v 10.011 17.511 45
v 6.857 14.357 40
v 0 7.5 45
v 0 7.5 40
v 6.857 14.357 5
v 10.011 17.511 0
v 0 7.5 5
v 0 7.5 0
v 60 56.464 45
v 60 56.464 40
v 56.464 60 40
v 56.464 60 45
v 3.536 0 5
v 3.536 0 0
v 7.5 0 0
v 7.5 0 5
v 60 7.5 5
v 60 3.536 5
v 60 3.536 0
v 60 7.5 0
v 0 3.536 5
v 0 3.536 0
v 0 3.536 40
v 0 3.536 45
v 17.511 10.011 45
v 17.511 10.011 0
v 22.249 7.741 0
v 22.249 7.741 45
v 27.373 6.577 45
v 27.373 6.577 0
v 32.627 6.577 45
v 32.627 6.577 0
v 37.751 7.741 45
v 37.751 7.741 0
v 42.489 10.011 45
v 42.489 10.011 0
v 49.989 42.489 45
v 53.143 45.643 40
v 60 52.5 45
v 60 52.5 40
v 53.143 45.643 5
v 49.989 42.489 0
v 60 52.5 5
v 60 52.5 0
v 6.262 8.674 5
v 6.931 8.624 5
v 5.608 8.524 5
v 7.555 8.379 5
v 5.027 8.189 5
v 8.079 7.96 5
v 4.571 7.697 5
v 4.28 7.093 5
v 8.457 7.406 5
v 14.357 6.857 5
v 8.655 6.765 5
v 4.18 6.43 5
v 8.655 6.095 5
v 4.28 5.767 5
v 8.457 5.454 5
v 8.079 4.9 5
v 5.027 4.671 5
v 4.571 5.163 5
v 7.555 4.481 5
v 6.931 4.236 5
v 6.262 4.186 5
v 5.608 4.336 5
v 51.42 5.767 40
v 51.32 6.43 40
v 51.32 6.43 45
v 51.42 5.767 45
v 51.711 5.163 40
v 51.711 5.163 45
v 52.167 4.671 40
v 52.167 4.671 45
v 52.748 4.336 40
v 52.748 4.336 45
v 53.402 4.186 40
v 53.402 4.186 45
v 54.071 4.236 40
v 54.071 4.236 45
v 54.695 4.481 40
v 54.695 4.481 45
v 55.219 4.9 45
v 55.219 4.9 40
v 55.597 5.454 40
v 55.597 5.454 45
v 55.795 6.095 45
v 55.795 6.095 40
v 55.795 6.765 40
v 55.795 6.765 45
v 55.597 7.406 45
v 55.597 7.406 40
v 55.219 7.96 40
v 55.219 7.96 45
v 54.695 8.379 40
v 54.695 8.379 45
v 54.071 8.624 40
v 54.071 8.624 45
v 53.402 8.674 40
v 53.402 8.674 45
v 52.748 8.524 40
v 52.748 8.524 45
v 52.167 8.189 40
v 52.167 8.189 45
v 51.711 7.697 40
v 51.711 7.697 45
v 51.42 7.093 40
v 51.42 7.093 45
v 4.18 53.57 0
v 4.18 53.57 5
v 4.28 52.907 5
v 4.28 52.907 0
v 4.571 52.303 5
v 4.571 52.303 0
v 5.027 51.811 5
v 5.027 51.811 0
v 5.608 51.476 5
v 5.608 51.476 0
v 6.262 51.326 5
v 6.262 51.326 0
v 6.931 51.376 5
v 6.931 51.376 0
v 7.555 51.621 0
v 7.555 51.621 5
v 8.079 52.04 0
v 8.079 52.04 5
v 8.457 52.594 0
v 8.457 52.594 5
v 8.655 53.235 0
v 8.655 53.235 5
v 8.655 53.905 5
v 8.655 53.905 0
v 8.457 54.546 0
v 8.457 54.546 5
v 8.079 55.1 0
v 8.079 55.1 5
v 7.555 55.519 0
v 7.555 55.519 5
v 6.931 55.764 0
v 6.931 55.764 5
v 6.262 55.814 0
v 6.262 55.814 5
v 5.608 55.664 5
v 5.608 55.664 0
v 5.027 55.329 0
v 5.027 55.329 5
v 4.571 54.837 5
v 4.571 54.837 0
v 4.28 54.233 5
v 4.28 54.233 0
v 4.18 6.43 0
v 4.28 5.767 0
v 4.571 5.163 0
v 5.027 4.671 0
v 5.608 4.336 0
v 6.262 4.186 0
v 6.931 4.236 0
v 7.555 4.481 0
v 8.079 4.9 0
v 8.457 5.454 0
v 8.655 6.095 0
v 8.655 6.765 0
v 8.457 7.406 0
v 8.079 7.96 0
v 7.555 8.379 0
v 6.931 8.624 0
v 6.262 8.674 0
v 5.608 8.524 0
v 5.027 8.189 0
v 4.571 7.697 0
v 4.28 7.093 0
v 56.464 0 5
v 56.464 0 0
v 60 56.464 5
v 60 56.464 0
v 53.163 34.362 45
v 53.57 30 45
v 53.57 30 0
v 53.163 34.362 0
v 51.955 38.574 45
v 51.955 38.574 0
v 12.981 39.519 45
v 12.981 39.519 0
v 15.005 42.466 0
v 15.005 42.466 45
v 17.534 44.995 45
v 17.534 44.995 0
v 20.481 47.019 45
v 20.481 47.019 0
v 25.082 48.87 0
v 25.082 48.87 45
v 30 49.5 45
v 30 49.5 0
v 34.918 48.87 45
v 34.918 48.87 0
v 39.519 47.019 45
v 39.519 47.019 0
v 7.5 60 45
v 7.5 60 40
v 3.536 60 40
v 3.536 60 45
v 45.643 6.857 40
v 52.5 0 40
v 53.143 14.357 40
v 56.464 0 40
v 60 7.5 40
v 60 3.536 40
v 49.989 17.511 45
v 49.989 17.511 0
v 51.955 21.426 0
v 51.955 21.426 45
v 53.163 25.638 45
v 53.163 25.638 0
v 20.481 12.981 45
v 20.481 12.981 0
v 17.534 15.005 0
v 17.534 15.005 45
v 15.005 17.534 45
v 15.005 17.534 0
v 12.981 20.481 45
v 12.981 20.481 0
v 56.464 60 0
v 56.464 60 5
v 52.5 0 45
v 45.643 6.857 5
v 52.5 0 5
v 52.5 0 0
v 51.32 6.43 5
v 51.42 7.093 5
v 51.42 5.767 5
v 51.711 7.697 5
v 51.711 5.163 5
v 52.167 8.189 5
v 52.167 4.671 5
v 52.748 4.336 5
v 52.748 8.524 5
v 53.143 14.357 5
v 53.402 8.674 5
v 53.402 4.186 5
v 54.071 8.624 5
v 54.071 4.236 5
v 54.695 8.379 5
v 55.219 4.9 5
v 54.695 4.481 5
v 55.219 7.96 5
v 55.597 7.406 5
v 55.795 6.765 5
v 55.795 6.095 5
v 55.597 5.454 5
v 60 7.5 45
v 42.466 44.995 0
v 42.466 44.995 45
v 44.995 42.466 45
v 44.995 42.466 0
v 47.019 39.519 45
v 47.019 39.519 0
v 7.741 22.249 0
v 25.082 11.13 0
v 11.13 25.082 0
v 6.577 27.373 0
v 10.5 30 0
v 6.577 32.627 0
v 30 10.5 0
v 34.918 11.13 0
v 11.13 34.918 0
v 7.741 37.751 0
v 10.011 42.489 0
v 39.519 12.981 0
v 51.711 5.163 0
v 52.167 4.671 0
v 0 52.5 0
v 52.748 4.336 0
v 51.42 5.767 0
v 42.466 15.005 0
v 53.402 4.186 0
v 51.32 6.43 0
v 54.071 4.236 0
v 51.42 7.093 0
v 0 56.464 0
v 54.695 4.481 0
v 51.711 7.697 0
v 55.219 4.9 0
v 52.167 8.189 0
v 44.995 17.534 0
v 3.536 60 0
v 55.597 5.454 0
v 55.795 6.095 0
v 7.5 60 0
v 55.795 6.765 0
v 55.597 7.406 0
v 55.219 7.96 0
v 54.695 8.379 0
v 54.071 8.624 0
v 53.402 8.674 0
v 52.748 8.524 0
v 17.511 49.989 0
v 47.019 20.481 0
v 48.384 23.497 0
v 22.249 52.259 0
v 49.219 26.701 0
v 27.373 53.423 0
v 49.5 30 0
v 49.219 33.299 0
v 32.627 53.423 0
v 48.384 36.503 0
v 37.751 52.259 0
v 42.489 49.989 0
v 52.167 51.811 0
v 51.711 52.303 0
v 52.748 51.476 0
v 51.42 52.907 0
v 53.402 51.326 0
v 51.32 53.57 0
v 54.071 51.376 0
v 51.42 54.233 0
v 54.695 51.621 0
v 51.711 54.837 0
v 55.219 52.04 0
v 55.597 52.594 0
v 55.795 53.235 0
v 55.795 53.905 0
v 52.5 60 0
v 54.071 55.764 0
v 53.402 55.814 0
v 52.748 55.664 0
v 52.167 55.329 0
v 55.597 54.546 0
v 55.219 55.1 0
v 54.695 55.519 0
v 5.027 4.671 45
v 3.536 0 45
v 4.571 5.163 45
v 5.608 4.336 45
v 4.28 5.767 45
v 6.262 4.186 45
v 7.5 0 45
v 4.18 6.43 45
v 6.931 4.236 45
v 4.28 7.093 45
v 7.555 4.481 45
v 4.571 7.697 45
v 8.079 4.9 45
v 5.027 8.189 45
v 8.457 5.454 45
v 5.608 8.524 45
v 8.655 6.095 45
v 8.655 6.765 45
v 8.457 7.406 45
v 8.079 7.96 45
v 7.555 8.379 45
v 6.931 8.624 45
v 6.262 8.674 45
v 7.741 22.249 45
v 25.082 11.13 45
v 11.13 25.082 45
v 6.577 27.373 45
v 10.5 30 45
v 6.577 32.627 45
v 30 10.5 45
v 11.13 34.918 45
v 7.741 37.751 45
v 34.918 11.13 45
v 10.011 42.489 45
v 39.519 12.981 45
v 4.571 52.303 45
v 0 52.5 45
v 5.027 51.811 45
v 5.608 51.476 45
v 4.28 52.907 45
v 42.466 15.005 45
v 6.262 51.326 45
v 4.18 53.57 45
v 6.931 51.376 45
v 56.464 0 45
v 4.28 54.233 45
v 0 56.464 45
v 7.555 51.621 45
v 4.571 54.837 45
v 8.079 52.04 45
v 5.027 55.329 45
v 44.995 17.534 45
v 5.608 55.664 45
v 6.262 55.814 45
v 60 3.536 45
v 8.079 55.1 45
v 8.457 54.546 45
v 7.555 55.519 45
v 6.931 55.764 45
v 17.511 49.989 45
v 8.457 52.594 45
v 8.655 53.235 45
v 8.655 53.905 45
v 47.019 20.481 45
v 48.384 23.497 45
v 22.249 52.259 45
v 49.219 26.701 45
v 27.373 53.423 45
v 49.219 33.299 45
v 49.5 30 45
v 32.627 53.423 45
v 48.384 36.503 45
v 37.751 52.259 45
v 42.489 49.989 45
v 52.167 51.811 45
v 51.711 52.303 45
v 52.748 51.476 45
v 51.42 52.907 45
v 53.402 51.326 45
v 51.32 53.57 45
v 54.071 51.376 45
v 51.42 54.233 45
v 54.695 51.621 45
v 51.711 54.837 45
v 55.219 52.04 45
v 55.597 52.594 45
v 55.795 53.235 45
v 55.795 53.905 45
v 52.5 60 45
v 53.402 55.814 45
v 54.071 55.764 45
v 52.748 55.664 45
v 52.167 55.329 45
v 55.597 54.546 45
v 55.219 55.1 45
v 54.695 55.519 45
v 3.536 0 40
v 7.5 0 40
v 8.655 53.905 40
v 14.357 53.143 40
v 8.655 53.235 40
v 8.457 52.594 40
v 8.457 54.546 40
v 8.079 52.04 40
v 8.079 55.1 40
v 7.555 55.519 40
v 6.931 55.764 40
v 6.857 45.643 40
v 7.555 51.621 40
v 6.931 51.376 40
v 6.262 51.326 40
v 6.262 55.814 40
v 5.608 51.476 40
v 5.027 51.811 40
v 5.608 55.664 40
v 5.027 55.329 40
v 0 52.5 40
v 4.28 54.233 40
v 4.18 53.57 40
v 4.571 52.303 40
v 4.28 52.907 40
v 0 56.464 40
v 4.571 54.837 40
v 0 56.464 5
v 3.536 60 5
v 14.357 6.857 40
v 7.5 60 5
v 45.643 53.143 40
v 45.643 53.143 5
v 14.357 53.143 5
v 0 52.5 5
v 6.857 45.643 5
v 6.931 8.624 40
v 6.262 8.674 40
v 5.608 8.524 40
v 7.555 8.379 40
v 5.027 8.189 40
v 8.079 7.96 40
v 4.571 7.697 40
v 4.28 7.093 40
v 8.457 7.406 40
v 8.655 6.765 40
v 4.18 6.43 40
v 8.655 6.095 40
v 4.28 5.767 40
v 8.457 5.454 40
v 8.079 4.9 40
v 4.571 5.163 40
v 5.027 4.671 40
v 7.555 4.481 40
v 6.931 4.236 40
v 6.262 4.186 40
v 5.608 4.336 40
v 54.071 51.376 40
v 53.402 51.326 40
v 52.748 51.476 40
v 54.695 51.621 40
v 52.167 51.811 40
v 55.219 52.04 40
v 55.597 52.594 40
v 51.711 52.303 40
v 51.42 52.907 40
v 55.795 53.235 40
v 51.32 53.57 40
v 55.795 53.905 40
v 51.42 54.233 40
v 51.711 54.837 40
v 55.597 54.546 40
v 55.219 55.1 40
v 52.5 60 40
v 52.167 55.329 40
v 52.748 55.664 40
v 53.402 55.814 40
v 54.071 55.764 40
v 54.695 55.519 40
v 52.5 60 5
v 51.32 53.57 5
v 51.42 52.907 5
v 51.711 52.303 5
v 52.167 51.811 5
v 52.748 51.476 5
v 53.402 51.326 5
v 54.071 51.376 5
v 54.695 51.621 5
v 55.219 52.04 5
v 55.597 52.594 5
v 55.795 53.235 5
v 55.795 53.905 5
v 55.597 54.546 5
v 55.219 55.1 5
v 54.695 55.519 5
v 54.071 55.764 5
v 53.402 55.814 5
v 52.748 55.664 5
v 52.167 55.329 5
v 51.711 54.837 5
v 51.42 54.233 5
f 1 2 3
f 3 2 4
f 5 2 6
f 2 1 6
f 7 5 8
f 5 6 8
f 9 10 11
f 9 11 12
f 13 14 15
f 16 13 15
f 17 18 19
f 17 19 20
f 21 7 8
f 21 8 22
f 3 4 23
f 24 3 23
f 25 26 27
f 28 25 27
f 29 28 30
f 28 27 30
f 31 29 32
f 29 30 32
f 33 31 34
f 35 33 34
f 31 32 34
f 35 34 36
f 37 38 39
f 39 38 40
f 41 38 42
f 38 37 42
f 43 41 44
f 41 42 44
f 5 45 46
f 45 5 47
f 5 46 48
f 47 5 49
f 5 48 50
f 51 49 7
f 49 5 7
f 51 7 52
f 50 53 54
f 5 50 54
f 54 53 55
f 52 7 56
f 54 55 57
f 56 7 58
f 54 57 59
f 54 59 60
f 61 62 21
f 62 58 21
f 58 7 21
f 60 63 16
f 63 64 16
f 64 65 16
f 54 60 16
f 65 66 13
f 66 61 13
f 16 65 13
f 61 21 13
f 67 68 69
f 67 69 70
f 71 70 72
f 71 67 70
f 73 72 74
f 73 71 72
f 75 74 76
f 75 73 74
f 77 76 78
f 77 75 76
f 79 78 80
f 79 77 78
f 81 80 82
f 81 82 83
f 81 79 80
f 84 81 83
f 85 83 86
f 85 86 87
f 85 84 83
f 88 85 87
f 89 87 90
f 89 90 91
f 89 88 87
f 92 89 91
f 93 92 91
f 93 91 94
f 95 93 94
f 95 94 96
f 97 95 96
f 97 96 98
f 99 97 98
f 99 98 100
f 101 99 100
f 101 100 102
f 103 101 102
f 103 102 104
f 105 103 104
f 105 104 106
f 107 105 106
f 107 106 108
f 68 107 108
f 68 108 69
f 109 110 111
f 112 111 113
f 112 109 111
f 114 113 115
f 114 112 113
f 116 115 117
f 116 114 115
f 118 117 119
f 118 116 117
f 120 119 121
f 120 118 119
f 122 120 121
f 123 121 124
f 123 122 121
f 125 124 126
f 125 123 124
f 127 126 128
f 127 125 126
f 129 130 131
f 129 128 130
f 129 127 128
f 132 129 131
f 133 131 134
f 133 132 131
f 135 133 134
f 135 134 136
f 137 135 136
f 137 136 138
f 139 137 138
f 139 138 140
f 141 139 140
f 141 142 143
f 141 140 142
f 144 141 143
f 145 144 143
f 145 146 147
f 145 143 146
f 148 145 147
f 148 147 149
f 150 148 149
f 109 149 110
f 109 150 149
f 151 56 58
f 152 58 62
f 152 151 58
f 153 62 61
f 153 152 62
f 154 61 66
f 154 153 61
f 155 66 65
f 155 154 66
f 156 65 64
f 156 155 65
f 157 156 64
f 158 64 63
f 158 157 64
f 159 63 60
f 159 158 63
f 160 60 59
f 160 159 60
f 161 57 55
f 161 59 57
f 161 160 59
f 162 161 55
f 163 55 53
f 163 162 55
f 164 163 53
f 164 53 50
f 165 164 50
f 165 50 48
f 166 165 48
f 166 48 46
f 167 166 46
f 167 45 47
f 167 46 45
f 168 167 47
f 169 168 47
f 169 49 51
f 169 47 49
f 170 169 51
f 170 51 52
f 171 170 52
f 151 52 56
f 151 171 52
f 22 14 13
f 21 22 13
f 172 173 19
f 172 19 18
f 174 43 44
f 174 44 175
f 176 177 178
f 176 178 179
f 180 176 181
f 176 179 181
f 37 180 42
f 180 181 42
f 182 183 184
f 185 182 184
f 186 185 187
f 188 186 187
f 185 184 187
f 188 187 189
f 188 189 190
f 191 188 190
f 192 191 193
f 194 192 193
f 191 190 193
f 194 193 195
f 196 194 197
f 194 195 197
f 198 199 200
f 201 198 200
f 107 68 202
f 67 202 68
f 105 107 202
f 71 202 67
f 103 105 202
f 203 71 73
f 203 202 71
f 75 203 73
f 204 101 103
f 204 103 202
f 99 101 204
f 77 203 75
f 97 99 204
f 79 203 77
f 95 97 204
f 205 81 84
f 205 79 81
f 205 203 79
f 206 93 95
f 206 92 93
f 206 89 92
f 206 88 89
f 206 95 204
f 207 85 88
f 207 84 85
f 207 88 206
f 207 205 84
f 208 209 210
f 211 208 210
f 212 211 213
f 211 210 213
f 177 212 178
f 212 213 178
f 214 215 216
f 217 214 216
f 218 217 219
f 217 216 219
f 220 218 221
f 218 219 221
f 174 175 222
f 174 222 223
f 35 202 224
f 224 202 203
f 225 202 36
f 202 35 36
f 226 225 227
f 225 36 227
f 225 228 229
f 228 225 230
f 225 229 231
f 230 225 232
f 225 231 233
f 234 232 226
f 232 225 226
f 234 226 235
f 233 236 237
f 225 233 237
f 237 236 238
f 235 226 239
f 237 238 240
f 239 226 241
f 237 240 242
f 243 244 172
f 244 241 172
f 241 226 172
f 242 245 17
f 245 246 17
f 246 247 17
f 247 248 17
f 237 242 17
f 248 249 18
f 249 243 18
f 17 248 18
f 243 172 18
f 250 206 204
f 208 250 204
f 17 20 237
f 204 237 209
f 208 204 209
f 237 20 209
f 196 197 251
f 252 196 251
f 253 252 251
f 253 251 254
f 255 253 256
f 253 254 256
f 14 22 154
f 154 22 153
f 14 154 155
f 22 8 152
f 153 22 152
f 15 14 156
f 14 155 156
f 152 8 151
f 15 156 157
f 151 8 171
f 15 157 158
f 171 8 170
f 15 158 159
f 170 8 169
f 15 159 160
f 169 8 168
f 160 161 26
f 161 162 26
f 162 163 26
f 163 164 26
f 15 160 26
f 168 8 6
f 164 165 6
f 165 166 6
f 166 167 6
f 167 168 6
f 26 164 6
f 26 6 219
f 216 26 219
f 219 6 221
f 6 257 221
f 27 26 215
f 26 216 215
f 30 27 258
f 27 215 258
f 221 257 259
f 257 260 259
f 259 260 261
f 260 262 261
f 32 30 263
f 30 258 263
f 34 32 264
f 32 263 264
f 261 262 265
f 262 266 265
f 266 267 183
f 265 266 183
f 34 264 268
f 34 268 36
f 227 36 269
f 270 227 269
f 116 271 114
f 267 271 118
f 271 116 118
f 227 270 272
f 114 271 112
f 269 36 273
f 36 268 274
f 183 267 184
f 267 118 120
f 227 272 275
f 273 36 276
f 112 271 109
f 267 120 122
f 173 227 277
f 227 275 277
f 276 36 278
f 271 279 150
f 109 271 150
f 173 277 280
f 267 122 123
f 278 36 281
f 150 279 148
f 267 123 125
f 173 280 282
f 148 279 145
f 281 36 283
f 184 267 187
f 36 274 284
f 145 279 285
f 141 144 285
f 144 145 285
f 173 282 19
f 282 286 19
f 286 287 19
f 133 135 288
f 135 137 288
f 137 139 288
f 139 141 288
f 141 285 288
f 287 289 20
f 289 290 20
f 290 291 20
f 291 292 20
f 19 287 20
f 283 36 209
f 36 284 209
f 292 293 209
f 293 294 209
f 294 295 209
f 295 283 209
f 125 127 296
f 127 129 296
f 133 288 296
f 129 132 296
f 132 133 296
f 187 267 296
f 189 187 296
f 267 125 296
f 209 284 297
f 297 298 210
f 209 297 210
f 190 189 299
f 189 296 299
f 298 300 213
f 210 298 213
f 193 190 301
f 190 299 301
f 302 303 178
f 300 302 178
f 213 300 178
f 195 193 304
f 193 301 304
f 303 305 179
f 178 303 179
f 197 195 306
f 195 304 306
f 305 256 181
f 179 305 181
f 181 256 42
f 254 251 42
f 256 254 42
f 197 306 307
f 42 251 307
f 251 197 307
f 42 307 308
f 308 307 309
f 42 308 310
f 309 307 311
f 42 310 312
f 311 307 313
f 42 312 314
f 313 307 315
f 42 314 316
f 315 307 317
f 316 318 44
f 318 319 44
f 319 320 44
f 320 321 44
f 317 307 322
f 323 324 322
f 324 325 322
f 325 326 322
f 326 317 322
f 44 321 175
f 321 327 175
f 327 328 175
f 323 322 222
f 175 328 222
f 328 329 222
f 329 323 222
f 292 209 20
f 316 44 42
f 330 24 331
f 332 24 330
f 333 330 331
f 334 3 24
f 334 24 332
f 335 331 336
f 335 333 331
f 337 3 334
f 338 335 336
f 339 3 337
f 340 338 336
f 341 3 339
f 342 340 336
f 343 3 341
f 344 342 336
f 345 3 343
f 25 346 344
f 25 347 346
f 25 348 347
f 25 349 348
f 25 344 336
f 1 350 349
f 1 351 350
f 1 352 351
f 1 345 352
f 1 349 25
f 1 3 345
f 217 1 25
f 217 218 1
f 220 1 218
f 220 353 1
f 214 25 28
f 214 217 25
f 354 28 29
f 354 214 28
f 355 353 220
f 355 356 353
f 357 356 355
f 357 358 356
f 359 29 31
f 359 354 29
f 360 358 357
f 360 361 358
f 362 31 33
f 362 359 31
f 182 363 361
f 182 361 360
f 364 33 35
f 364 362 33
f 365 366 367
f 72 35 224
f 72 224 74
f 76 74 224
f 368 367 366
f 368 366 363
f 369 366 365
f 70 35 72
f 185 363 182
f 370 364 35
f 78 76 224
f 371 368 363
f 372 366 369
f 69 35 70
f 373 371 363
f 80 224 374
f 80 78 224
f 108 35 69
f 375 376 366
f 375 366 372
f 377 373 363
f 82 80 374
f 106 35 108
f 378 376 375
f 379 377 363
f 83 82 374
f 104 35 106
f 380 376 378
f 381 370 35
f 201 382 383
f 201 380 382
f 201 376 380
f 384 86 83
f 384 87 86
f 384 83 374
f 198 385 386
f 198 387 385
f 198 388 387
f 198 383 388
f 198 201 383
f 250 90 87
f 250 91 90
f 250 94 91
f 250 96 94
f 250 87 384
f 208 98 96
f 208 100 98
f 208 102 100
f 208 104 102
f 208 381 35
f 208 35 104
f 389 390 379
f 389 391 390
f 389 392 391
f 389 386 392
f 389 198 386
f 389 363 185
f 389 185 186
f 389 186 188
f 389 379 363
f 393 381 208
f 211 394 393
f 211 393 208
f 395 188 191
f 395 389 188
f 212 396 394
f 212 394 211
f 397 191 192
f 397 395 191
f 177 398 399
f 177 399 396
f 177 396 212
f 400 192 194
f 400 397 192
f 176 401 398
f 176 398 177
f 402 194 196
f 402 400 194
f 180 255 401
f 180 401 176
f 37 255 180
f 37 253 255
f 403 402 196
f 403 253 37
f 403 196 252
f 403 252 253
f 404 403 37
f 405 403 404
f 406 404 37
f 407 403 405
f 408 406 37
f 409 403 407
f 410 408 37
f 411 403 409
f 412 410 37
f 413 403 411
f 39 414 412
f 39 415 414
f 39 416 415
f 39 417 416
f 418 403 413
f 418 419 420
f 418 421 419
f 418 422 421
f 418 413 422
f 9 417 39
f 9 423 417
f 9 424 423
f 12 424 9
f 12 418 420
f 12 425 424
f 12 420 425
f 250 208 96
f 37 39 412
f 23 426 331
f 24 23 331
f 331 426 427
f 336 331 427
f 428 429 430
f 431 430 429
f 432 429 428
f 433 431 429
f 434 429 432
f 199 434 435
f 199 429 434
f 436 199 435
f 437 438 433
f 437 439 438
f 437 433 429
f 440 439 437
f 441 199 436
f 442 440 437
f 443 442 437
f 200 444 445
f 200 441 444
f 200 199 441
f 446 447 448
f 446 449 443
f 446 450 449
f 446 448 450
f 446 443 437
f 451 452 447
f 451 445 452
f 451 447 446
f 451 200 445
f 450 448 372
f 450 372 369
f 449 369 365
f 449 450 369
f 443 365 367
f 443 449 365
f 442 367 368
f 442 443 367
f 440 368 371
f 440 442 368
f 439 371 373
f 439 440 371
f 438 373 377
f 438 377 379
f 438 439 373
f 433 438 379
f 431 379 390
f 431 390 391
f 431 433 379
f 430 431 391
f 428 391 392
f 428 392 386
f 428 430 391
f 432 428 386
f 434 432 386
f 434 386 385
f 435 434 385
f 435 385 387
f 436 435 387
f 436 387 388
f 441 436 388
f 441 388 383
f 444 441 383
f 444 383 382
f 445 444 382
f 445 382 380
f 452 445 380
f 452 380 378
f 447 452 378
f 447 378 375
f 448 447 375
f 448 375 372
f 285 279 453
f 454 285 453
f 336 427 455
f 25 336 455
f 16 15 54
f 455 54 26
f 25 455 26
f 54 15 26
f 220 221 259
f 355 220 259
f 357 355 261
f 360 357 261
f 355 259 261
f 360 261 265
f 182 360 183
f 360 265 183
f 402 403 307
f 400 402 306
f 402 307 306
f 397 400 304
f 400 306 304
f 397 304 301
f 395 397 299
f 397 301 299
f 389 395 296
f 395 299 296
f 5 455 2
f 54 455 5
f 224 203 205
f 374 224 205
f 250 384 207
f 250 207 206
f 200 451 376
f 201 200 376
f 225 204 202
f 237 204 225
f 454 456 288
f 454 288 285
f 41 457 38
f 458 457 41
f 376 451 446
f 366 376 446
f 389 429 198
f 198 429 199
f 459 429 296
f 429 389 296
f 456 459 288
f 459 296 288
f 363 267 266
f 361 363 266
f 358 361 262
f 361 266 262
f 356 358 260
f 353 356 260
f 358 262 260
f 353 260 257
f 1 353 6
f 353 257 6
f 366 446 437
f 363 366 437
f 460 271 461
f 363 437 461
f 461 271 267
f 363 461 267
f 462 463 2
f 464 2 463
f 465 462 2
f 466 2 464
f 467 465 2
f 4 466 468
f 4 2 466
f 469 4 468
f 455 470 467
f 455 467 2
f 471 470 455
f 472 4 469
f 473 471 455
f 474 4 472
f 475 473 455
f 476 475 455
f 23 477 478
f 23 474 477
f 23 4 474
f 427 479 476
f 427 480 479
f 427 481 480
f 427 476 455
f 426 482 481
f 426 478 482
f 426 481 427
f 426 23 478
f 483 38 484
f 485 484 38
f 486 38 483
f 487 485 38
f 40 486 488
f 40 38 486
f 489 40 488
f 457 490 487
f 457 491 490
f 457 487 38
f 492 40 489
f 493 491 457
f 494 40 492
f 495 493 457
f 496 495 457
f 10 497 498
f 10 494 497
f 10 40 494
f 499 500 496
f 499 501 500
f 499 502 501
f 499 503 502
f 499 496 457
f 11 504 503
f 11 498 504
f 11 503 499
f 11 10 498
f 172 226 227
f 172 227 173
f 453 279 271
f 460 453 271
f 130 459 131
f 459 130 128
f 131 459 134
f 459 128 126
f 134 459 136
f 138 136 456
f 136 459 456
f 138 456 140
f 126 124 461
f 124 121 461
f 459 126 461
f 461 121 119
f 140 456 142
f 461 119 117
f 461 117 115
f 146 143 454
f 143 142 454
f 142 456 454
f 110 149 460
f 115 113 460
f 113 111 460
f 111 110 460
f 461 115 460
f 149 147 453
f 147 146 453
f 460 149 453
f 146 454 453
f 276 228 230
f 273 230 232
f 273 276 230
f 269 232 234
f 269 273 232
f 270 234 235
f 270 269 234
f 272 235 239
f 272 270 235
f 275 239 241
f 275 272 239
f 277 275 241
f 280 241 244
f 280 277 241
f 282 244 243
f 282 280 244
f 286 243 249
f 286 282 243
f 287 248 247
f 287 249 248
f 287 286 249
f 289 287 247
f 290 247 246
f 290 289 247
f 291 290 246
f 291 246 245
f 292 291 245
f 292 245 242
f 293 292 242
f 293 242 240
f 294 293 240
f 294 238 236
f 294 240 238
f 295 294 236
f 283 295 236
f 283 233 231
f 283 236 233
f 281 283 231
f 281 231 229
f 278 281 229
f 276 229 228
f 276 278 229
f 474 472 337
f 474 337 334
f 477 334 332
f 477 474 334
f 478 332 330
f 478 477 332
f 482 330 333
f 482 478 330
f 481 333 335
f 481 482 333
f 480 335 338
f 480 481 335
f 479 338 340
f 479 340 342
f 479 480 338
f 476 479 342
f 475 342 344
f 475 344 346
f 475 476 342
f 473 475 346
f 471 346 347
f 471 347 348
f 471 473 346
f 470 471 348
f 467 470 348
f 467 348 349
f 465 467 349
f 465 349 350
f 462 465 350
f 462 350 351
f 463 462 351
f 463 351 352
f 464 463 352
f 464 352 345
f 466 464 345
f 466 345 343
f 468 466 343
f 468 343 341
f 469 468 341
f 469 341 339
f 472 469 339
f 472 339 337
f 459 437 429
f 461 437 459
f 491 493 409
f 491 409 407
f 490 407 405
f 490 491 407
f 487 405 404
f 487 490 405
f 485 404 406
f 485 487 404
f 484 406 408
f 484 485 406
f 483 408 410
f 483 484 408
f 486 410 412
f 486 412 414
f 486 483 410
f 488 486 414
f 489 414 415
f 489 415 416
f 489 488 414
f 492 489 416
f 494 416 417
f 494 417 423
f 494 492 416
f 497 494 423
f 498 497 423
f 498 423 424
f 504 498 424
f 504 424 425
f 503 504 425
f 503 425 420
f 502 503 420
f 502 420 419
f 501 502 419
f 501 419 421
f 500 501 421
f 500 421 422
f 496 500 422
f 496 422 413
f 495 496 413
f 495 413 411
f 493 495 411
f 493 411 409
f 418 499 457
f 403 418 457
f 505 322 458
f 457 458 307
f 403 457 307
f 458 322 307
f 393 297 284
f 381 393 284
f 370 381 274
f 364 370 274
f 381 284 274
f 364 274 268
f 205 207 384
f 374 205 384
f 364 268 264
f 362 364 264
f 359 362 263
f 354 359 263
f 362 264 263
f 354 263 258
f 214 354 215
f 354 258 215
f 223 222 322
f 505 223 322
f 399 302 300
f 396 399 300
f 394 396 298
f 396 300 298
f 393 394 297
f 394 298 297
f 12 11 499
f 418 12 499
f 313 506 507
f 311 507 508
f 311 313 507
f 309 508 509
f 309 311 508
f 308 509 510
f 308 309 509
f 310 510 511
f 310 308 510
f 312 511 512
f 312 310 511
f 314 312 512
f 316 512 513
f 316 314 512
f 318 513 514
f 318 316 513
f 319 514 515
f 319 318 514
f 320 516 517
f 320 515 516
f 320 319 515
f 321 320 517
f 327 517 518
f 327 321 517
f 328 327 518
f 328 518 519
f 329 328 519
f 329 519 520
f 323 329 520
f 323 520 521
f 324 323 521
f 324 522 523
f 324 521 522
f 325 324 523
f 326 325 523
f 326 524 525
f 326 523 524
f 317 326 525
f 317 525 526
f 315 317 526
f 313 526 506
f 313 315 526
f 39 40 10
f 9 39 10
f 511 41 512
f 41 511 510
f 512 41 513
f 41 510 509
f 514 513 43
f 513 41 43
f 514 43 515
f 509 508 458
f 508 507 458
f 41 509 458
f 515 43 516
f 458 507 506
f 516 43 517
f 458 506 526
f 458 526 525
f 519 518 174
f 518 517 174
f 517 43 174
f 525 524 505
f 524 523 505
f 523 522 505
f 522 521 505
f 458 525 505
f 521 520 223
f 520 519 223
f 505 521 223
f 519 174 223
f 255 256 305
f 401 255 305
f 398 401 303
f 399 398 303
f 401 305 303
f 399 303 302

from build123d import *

# Parameters (mm, degrees)
SKETCH1_R           = 2.25
BOSS_EXTRUDE1_DEPTH = 45
CHAMFER1_SIZE       = 3.535533906
SKETCH2_W           = 35
SKETCH2_H           = 10.606601718
CUT_EXTRUDE1_DEPTH  = 12.5
CIRPATTERN1_COUNT   = 4


with BuildPart() as part:
    # Sketch1 → Boss-Extrude1 (new body)
    # profile 1 of 12: a face of its own
    with BuildSketch(Plane.XY):
        with BuildLine():
            Line((0, 60), (0, 52.5))
            Line((0, 52.5), (10.010851315, 42.489148685))
            ThreePointArc((10.010851315, 42.489148685), (13.333493167, 46.666506833), (17.510851315, 49.989148685))
            Line((17.510851315, 49.989148685), (7.5, 60))
            Line((7.5, 60), (0, 60))
        make_face()
        with Locations(Location((6.43, 53.57, 0), (0, 0, 180))):
            Circle(SKETCH1_R, mode=Mode.SUBTRACT)
    # profile 2 of 12: a face of its own
    with BuildSketch(Plane.XY):
        with BuildLine():
            ThreePointArc((17.510851315, 49.989148685), (13.333493167, 46.666506833), (10.010851315, 42.489148685))
            Line((10.010851315, 42.489148685), (12.98114549, 39.51885451))
            ThreePointArc((12.98114549, 39.51885451), (16.211417767, 43.788582233), (20.48114549, 47.01885451))
            Line((20.48114549, 47.01885451), (17.510851315, 49.989148685))
        make_face()
    # profile 3 of 12: a face of its own
    with BuildSketch(Plane.XY):
        with BuildLine():
            ThreePointArc((42.489148685, 49.989148685), (30, 53.57), (17.510851315, 49.989148685))
            Line((17.510851315, 49.989148685), (20.48114549, 47.01885451))
            ThreePointArc((20.48114549, 47.01885451), (30, 49.5), (39.51885451, 47.01885451))
            Line((39.51885451, 47.01885451), (42.489148685, 49.989148685))
        make_face()
    # profile 4 of 12: a face of its own
    with BuildSketch(Plane.XY):
        with BuildLine():
            ThreePointArc((49.989148685, 42.489148685), (46.666506833, 46.666506833), (42.489148685, 49.989148685))
            Line((42.489148685, 49.989148685), (39.51885451, 47.01885451))
            ThreePointArc((39.51885451, 47.01885451), (43.788582233, 43.788582233), (47.01885451, 39.51885451))
            Line((47.01885451, 39.51885451), (49.989148685, 42.489148685))
        make_face()
    # profile 5 of 12: a face of its own
    with BuildSketch(Plane.XY):
        with BuildLine():
            Line((49.989148685, 42.489148685), (60, 52.5))
            Line((60, 52.5), (60, 60))
            Line((60, 60), (52.5, 60))
            Line((52.5, 60), (42.489148685, 49.989148685))
            ThreePointArc((42.489148685, 49.989148685), (46.666506833, 46.666506833), (49.989148685, 42.489148685))
        make_face()
        with Locations(Location((53.57, 53.57, 0), (0, 0, 180))):
            Circle(SKETCH1_R, mode=Mode.SUBTRACT)
    # profile 6 of 12: a face of its own
    with BuildSketch(Plane.XY):
        with BuildLine():
            Line((47.01885451, 20.48114549), (49.989148685, 17.510851315))
            ThreePointArc((49.989148685, 17.510851315), (52.657108537, 23.503821681), (53.57, 30))
            ThreePointArc((53.57, 30), (52.657108537, 36.496178319), (49.989148685, 42.489148685))
            Line((49.989148685, 42.489148685), (47.01885451, 39.51885451))
            ThreePointArc((47.01885451, 39.51885451), (48.869521231, 34.918451843), (49.5, 30))
            ThreePointArc((49.5, 30), (48.869521231, 25.081548157), (47.01885451, 20.48114549))
        make_face()
    # profile 7 of 12: a face of its own
    with BuildSketch(Plane.XY):
        with BuildLine():
            Line((42.489148685, 10.010851315), (52.5, 0))
            Line((52.5, 0), (60, 0))
            Line((60, 0), (60, 7.5))
            Line((60, 7.5), (49.989148685, 17.510851315))
            ThreePointArc((49.989148685, 17.510851315), (46.666506833, 13.333493167), (42.489148685, 10.010851315))
        make_face()
        with Locations(Location((53.57, 6.43, 0), (0, 0, 180))):
            Circle(SKETCH1_R, mode=Mode.SUBTRACT)
    # profile 8 of 12: a face of its own
    with BuildSketch(Plane.XY):
        with BuildLine():
            Line((20.48114549, 12.98114549), (17.510851315, 10.010851315))
            ThreePointArc((17.510851315, 10.010851315), (30, 6.43), (42.489148685, 10.010851315))
            Line((42.489148685, 10.010851315), (39.51885451, 12.98114549))
            ThreePointArc((39.51885451, 12.98114549), (30, 10.5), (20.48114549, 12.98114549))
        make_face()
    # profile 9 of 12: a face of its own
    with BuildSketch(Plane.XY):
        with BuildLine():
            ThreePointArc((10.010851315, 17.510851315), (13.333493167, 13.333493167), (17.510851315, 10.010851315))
            Line((17.510851315, 10.010851315), (20.48114549, 12.98114549))
            ThreePointArc((20.48114549, 12.98114549), (16.211417767, 16.211417767), (12.98114549, 20.48114549))
            Line((12.98114549, 20.48114549), (10.010851315, 17.510851315))
        make_face()
    # profile 10 of 12: a face of its own
    with BuildSketch(Plane.XY):
        with BuildLine():
            Line((0, 7.5), (0, 0))
            Line((0, 0), (7.5, 0))
            Line((7.5, 0), (17.510851315, 10.010851315))
            ThreePointArc((17.510851315, 10.010851315), (13.333493167, 13.333493167), (10.010851315, 17.510851315))
            Line((10.010851315, 17.510851315), (0, 7.5))
        make_face()
        with Locations(Location((6.43, 6.43, 0), (0, 0, 180))):
            Circle(SKETCH1_R, mode=Mode.SUBTRACT)
    # profile 11 of 12: a face of its own
    with BuildSketch(Plane.XY):
        with BuildLine():
            Line((39.51885451, 12.98114549), (42.489148685, 10.010851315))
            ThreePointArc((42.489148685, 10.010851315), (46.666506833, 13.333493167), (49.989148685, 17.510851315))
            Line((49.989148685, 17.510851315), (47.01885451, 20.48114549))
            ThreePointArc((47.01885451, 20.48114549), (43.788582233, 16.211417767), (39.51885451, 12.98114549))
        make_face()
    # profile 12 of 12: a face of its own
    with BuildSketch(Plane.XY):
        with BuildLine():
            ThreePointArc((10.010851315, 42.489148685), (6.43, 30), (10.010851315, 17.510851315))
            Line((10.010851315, 17.510851315), (12.98114549, 20.48114549))
            ThreePointArc((12.98114549, 20.48114549), (10.5, 30), (12.98114549, 39.51885451))
            Line((12.98114549, 39.51885451), (10.010851315, 42.489148685))
        make_face()
    extrude(amount=BOSS_EXTRUDE1_DEPTH)

    # Chamfer1
    chamfer1_edges = [part.edges().sort_by_distance(p)[0] for p in [
        (0, 60, 22.5),
        (60, 60, 22.5),
        (60, 0, 22.5),
        (0, 0, 22.5),
    ]]
    chamfer(chamfer1_edges, length=CHAMFER1_SIZE)

    # Sketch2 → Cut-Extrude1 (cut)
    with BuildSketch(Plane(origin=(58.232233047, 58.232233047, 0), x_dir=(0, 0, -1), z_dir=(0.7071067811865489, 0.7071067811865461, 0))):
        with Locations((-22.5, 0)):
            Rectangle(SKETCH2_W, SKETCH2_H)
    cut_extrude1 = extrude(amount=-CUT_EXTRUDE1_DEPTH, mode=Mode.SUBTRACT)

    # CirPattern1: Cut-Extrude1 ×4 about axis
    cirpattern1_axis = Axis((30, 30, 0), (0, 0, 1))
    for i in range(1, CIRPATTERN1_COUNT):
        add(cut_extrude1.rotate(cirpattern1_axis, i * 360 / CIRPATTERN1_COUNT), mode=Mode.SUBTRACT)


solid = part.part
